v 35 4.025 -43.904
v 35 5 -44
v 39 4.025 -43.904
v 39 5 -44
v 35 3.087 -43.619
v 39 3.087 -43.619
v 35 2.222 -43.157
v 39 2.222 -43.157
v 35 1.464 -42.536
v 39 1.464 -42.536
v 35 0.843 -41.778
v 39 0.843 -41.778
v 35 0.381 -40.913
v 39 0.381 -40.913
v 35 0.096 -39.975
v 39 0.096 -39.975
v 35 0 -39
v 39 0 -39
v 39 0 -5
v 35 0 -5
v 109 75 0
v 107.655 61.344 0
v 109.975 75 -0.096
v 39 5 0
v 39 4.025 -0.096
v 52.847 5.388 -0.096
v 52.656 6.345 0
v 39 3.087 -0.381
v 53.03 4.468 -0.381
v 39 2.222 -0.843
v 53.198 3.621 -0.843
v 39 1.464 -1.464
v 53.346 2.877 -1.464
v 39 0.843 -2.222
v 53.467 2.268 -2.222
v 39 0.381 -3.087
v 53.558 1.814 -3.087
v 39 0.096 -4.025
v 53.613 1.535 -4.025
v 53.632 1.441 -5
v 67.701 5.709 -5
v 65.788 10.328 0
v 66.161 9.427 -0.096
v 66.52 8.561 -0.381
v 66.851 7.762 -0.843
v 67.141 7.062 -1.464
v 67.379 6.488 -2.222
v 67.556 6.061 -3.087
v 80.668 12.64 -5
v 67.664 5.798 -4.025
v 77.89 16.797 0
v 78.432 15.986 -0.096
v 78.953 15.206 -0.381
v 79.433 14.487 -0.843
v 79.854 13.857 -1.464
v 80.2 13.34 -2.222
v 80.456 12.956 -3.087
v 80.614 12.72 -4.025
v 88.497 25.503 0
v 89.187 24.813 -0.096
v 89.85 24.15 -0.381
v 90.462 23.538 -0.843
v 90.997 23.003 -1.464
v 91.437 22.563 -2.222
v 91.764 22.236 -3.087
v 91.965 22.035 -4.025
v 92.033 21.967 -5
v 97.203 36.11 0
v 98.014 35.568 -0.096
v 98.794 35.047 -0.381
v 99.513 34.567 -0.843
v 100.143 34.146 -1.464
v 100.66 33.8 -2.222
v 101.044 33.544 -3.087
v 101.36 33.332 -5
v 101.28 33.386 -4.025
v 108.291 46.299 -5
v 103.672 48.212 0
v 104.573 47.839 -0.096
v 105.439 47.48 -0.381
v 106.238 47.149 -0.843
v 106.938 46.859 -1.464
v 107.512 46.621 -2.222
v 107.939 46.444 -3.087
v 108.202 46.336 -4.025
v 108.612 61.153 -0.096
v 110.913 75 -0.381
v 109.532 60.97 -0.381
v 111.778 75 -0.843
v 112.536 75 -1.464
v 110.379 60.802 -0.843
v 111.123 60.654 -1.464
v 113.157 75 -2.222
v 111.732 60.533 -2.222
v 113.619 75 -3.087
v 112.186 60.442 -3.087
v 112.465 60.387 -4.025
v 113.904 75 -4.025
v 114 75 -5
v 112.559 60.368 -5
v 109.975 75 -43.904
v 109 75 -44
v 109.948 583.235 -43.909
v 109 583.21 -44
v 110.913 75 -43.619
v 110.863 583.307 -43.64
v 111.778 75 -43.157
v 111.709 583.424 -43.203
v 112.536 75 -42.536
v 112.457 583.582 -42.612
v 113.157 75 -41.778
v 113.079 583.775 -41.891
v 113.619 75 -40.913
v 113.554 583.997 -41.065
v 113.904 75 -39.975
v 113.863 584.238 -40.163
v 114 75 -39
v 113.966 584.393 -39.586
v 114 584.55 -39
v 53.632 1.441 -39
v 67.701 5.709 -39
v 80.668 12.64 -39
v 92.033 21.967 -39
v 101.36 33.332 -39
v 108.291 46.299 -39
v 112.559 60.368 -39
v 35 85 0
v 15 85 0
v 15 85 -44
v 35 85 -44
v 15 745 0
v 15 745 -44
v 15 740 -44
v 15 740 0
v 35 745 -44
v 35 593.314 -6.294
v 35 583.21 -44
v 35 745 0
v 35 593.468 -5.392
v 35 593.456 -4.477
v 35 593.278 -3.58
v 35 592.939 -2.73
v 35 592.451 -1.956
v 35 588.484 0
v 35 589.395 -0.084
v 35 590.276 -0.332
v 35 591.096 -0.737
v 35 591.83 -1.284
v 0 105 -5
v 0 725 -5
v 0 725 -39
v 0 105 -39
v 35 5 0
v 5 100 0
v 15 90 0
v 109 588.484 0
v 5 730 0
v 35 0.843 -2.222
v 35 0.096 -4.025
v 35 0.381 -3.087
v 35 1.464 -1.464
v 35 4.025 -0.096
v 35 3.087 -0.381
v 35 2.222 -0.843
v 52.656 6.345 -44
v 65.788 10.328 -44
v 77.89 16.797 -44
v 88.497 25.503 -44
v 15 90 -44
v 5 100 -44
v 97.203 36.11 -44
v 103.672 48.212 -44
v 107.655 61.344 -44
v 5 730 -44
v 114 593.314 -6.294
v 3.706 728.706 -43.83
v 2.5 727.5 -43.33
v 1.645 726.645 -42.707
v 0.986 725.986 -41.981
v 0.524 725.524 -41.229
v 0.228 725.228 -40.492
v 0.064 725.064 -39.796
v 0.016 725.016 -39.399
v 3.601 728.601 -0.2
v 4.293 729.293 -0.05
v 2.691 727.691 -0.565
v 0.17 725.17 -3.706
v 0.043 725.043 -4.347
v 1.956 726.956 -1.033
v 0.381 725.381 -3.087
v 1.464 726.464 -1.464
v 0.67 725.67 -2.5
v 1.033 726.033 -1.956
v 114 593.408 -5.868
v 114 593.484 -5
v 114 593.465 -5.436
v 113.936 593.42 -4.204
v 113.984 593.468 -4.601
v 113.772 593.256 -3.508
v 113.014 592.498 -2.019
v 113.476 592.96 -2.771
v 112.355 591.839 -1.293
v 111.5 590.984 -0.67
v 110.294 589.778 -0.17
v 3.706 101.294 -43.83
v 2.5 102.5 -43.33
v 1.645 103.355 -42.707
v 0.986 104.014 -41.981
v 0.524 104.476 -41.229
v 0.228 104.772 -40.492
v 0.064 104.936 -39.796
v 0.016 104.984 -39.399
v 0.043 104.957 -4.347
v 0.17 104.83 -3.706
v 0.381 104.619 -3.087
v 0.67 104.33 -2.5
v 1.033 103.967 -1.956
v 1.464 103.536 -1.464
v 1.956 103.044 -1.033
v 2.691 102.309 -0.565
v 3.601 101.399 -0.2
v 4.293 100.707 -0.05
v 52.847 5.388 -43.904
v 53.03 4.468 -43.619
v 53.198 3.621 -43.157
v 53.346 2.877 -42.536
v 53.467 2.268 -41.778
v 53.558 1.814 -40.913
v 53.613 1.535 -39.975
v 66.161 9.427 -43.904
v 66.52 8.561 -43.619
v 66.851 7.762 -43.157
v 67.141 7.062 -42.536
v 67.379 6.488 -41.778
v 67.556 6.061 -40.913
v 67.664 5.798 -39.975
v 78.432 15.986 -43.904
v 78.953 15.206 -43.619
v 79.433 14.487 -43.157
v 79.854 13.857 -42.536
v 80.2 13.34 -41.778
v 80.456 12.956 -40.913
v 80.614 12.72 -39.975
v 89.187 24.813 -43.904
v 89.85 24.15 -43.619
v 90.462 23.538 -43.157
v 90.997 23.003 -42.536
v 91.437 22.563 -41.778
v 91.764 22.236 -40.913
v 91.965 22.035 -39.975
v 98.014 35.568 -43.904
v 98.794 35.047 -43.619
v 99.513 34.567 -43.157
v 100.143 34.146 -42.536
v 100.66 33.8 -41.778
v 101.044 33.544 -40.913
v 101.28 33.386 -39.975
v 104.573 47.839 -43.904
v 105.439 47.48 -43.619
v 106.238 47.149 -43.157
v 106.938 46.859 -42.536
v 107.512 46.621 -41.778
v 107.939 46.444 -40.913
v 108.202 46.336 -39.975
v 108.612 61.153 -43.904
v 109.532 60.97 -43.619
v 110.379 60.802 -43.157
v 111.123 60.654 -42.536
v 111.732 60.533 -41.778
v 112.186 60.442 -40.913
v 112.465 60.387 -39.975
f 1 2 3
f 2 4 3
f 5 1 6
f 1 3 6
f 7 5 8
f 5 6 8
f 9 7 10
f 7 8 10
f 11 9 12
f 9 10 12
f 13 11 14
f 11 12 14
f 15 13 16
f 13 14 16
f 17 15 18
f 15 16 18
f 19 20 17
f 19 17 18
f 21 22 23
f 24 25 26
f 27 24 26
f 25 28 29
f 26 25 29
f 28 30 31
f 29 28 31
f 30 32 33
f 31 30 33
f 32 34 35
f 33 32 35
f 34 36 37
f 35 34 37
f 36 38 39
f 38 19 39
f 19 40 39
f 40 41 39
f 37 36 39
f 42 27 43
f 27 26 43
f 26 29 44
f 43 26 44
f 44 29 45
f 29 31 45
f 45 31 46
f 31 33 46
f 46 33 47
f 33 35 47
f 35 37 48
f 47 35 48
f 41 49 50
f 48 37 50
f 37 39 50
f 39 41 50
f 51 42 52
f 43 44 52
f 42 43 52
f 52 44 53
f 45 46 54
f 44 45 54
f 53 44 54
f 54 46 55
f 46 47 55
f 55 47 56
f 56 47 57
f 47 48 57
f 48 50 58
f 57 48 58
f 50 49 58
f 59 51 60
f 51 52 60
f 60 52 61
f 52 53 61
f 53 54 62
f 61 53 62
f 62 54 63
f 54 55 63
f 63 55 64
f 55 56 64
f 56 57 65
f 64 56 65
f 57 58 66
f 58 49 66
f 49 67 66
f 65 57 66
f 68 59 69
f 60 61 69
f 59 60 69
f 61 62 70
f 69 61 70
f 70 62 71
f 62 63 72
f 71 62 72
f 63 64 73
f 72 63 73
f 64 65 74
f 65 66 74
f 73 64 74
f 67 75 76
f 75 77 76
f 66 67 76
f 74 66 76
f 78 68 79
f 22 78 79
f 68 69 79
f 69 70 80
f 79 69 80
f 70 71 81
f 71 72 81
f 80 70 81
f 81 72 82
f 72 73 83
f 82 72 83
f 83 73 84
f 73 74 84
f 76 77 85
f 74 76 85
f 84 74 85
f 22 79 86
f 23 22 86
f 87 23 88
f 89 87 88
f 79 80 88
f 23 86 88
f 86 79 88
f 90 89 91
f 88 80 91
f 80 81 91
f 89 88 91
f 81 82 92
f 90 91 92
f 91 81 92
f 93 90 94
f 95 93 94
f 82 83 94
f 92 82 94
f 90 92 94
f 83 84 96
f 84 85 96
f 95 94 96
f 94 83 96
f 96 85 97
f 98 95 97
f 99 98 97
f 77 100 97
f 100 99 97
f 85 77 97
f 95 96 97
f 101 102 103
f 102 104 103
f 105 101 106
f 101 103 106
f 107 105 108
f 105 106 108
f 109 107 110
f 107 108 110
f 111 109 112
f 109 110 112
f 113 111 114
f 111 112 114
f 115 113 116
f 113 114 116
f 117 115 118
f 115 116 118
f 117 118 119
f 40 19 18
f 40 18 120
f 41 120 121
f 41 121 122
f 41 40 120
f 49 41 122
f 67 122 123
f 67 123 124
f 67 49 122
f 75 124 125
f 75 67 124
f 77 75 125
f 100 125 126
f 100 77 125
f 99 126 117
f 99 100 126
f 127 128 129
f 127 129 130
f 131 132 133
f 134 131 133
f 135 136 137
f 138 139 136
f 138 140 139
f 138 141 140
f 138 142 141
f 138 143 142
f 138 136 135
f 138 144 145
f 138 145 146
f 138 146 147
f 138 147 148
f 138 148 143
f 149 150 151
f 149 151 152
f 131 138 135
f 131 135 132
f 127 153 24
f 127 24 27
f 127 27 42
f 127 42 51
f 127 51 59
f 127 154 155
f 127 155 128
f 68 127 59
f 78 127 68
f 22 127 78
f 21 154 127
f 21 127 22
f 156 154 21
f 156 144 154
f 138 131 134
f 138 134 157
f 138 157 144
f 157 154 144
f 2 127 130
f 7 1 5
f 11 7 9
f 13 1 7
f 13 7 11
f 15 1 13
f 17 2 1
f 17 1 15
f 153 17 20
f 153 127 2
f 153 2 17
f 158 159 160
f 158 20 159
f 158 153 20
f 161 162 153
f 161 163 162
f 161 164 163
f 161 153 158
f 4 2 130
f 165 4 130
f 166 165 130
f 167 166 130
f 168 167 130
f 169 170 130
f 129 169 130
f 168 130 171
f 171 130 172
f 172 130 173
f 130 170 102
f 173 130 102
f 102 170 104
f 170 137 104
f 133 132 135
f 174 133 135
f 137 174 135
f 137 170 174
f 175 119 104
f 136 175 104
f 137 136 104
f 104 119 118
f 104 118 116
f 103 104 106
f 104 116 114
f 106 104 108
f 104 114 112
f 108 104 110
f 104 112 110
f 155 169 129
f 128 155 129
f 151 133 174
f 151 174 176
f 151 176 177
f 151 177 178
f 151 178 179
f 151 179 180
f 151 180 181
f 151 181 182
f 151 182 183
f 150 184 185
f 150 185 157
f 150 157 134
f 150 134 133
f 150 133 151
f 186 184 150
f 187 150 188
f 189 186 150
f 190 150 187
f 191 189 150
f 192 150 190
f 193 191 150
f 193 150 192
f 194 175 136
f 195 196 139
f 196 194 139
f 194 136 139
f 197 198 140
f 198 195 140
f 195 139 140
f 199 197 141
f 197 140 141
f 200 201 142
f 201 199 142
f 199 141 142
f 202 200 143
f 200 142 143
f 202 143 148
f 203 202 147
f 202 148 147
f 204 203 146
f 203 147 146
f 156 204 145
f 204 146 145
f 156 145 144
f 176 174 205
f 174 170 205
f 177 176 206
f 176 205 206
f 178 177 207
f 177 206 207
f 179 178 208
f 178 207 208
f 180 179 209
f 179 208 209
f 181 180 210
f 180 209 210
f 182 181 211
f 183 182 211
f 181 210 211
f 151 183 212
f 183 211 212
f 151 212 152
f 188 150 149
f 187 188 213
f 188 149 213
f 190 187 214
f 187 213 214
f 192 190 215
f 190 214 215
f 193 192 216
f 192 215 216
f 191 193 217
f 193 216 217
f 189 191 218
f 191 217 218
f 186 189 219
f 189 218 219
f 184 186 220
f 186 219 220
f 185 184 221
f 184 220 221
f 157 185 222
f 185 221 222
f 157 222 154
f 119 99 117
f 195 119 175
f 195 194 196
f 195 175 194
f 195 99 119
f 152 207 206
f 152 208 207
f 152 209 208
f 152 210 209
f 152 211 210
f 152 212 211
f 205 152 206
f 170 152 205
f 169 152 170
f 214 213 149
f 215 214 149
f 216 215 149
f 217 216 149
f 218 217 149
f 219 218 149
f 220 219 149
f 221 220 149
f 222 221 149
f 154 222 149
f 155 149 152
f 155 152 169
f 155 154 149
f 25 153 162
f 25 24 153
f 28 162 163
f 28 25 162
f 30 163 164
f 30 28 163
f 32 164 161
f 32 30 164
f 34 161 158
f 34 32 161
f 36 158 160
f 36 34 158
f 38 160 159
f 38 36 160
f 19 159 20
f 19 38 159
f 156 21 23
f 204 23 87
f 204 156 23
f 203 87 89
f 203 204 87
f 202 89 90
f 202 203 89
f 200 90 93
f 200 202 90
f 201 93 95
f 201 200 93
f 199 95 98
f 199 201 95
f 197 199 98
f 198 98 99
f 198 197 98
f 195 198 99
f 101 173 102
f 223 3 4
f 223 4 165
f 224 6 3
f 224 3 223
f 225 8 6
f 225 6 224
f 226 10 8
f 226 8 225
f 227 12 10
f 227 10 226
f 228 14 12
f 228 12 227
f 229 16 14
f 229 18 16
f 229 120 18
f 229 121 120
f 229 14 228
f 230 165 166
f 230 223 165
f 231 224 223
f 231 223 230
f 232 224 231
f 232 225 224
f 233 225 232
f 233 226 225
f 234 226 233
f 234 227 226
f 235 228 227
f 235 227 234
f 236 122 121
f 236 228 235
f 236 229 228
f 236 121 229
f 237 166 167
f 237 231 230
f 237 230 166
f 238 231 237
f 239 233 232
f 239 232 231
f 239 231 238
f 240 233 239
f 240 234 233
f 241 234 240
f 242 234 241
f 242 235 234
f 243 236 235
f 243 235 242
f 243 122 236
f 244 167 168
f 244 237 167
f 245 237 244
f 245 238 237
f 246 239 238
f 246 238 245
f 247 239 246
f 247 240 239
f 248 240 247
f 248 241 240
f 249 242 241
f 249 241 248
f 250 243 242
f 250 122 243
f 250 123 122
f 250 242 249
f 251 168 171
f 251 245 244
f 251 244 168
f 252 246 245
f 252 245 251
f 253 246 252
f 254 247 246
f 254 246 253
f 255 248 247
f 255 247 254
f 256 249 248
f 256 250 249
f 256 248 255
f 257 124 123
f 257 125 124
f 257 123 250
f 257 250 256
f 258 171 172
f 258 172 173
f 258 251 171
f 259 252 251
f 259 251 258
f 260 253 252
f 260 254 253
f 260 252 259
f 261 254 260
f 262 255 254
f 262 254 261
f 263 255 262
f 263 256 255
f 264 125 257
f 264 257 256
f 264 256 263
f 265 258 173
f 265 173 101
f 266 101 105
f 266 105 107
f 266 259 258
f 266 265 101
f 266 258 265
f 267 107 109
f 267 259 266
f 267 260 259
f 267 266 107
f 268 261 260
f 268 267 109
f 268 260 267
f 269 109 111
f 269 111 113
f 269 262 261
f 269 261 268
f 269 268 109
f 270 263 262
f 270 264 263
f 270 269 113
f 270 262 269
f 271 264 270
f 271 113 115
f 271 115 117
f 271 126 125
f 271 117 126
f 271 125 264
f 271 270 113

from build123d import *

# Parameters (mm, degrees)
F1_DEPTH = 44
F3_DEPTH = 79
F4_R     = 5


with BuildPart() as f1:
    # F0 (on Top) → F1 (new body)
    with BuildSketch(Plane.XY):
        with BuildLine():
            Line((35, 85), (35, 0))
            Line((35, 0), (39, 0))
            ThreePointArc((39, 0), (92.033008589, 21.966991411), (114, 75))
            Line((114, 75), (114, 595))
            Line((114, 595), (35, 595))
            Line((35, 595), (35, 745))
            Line((35, 745), (15, 745))
            Line((15, 745), (15, 740))
            Line((15, 740), (0, 725))
            Line((0, 725), (0, 105))
            Line((0, 105), (15, 90))
            Line((15, 90), (15, 85))
            Line((15, 85), (35, 85))
        make_face()
    extrude(amount=-F1_DEPTH)

    # F2 (on face) → F3 (cut)
    with BuildSketch(Plane.YZ.offset(114)):
        Polygon((595, -44), (595, 0), (583.210235533, -44), align=None)
    extrude(amount=-F3_DEPTH, mode=Mode.SUBTRACT)

    # F4
    f4_edges = [f1.edges().sort_by_distance(p)[0] for p in [
        (37, 0, 0),
        (114, 329.105118, -44),
        (0, 415, 0),
        (0, 415, -44),
        (74.5, 595, 0),
    ]]
    fillet(f4_edges, radius=F4_R)


solid = f1.part
